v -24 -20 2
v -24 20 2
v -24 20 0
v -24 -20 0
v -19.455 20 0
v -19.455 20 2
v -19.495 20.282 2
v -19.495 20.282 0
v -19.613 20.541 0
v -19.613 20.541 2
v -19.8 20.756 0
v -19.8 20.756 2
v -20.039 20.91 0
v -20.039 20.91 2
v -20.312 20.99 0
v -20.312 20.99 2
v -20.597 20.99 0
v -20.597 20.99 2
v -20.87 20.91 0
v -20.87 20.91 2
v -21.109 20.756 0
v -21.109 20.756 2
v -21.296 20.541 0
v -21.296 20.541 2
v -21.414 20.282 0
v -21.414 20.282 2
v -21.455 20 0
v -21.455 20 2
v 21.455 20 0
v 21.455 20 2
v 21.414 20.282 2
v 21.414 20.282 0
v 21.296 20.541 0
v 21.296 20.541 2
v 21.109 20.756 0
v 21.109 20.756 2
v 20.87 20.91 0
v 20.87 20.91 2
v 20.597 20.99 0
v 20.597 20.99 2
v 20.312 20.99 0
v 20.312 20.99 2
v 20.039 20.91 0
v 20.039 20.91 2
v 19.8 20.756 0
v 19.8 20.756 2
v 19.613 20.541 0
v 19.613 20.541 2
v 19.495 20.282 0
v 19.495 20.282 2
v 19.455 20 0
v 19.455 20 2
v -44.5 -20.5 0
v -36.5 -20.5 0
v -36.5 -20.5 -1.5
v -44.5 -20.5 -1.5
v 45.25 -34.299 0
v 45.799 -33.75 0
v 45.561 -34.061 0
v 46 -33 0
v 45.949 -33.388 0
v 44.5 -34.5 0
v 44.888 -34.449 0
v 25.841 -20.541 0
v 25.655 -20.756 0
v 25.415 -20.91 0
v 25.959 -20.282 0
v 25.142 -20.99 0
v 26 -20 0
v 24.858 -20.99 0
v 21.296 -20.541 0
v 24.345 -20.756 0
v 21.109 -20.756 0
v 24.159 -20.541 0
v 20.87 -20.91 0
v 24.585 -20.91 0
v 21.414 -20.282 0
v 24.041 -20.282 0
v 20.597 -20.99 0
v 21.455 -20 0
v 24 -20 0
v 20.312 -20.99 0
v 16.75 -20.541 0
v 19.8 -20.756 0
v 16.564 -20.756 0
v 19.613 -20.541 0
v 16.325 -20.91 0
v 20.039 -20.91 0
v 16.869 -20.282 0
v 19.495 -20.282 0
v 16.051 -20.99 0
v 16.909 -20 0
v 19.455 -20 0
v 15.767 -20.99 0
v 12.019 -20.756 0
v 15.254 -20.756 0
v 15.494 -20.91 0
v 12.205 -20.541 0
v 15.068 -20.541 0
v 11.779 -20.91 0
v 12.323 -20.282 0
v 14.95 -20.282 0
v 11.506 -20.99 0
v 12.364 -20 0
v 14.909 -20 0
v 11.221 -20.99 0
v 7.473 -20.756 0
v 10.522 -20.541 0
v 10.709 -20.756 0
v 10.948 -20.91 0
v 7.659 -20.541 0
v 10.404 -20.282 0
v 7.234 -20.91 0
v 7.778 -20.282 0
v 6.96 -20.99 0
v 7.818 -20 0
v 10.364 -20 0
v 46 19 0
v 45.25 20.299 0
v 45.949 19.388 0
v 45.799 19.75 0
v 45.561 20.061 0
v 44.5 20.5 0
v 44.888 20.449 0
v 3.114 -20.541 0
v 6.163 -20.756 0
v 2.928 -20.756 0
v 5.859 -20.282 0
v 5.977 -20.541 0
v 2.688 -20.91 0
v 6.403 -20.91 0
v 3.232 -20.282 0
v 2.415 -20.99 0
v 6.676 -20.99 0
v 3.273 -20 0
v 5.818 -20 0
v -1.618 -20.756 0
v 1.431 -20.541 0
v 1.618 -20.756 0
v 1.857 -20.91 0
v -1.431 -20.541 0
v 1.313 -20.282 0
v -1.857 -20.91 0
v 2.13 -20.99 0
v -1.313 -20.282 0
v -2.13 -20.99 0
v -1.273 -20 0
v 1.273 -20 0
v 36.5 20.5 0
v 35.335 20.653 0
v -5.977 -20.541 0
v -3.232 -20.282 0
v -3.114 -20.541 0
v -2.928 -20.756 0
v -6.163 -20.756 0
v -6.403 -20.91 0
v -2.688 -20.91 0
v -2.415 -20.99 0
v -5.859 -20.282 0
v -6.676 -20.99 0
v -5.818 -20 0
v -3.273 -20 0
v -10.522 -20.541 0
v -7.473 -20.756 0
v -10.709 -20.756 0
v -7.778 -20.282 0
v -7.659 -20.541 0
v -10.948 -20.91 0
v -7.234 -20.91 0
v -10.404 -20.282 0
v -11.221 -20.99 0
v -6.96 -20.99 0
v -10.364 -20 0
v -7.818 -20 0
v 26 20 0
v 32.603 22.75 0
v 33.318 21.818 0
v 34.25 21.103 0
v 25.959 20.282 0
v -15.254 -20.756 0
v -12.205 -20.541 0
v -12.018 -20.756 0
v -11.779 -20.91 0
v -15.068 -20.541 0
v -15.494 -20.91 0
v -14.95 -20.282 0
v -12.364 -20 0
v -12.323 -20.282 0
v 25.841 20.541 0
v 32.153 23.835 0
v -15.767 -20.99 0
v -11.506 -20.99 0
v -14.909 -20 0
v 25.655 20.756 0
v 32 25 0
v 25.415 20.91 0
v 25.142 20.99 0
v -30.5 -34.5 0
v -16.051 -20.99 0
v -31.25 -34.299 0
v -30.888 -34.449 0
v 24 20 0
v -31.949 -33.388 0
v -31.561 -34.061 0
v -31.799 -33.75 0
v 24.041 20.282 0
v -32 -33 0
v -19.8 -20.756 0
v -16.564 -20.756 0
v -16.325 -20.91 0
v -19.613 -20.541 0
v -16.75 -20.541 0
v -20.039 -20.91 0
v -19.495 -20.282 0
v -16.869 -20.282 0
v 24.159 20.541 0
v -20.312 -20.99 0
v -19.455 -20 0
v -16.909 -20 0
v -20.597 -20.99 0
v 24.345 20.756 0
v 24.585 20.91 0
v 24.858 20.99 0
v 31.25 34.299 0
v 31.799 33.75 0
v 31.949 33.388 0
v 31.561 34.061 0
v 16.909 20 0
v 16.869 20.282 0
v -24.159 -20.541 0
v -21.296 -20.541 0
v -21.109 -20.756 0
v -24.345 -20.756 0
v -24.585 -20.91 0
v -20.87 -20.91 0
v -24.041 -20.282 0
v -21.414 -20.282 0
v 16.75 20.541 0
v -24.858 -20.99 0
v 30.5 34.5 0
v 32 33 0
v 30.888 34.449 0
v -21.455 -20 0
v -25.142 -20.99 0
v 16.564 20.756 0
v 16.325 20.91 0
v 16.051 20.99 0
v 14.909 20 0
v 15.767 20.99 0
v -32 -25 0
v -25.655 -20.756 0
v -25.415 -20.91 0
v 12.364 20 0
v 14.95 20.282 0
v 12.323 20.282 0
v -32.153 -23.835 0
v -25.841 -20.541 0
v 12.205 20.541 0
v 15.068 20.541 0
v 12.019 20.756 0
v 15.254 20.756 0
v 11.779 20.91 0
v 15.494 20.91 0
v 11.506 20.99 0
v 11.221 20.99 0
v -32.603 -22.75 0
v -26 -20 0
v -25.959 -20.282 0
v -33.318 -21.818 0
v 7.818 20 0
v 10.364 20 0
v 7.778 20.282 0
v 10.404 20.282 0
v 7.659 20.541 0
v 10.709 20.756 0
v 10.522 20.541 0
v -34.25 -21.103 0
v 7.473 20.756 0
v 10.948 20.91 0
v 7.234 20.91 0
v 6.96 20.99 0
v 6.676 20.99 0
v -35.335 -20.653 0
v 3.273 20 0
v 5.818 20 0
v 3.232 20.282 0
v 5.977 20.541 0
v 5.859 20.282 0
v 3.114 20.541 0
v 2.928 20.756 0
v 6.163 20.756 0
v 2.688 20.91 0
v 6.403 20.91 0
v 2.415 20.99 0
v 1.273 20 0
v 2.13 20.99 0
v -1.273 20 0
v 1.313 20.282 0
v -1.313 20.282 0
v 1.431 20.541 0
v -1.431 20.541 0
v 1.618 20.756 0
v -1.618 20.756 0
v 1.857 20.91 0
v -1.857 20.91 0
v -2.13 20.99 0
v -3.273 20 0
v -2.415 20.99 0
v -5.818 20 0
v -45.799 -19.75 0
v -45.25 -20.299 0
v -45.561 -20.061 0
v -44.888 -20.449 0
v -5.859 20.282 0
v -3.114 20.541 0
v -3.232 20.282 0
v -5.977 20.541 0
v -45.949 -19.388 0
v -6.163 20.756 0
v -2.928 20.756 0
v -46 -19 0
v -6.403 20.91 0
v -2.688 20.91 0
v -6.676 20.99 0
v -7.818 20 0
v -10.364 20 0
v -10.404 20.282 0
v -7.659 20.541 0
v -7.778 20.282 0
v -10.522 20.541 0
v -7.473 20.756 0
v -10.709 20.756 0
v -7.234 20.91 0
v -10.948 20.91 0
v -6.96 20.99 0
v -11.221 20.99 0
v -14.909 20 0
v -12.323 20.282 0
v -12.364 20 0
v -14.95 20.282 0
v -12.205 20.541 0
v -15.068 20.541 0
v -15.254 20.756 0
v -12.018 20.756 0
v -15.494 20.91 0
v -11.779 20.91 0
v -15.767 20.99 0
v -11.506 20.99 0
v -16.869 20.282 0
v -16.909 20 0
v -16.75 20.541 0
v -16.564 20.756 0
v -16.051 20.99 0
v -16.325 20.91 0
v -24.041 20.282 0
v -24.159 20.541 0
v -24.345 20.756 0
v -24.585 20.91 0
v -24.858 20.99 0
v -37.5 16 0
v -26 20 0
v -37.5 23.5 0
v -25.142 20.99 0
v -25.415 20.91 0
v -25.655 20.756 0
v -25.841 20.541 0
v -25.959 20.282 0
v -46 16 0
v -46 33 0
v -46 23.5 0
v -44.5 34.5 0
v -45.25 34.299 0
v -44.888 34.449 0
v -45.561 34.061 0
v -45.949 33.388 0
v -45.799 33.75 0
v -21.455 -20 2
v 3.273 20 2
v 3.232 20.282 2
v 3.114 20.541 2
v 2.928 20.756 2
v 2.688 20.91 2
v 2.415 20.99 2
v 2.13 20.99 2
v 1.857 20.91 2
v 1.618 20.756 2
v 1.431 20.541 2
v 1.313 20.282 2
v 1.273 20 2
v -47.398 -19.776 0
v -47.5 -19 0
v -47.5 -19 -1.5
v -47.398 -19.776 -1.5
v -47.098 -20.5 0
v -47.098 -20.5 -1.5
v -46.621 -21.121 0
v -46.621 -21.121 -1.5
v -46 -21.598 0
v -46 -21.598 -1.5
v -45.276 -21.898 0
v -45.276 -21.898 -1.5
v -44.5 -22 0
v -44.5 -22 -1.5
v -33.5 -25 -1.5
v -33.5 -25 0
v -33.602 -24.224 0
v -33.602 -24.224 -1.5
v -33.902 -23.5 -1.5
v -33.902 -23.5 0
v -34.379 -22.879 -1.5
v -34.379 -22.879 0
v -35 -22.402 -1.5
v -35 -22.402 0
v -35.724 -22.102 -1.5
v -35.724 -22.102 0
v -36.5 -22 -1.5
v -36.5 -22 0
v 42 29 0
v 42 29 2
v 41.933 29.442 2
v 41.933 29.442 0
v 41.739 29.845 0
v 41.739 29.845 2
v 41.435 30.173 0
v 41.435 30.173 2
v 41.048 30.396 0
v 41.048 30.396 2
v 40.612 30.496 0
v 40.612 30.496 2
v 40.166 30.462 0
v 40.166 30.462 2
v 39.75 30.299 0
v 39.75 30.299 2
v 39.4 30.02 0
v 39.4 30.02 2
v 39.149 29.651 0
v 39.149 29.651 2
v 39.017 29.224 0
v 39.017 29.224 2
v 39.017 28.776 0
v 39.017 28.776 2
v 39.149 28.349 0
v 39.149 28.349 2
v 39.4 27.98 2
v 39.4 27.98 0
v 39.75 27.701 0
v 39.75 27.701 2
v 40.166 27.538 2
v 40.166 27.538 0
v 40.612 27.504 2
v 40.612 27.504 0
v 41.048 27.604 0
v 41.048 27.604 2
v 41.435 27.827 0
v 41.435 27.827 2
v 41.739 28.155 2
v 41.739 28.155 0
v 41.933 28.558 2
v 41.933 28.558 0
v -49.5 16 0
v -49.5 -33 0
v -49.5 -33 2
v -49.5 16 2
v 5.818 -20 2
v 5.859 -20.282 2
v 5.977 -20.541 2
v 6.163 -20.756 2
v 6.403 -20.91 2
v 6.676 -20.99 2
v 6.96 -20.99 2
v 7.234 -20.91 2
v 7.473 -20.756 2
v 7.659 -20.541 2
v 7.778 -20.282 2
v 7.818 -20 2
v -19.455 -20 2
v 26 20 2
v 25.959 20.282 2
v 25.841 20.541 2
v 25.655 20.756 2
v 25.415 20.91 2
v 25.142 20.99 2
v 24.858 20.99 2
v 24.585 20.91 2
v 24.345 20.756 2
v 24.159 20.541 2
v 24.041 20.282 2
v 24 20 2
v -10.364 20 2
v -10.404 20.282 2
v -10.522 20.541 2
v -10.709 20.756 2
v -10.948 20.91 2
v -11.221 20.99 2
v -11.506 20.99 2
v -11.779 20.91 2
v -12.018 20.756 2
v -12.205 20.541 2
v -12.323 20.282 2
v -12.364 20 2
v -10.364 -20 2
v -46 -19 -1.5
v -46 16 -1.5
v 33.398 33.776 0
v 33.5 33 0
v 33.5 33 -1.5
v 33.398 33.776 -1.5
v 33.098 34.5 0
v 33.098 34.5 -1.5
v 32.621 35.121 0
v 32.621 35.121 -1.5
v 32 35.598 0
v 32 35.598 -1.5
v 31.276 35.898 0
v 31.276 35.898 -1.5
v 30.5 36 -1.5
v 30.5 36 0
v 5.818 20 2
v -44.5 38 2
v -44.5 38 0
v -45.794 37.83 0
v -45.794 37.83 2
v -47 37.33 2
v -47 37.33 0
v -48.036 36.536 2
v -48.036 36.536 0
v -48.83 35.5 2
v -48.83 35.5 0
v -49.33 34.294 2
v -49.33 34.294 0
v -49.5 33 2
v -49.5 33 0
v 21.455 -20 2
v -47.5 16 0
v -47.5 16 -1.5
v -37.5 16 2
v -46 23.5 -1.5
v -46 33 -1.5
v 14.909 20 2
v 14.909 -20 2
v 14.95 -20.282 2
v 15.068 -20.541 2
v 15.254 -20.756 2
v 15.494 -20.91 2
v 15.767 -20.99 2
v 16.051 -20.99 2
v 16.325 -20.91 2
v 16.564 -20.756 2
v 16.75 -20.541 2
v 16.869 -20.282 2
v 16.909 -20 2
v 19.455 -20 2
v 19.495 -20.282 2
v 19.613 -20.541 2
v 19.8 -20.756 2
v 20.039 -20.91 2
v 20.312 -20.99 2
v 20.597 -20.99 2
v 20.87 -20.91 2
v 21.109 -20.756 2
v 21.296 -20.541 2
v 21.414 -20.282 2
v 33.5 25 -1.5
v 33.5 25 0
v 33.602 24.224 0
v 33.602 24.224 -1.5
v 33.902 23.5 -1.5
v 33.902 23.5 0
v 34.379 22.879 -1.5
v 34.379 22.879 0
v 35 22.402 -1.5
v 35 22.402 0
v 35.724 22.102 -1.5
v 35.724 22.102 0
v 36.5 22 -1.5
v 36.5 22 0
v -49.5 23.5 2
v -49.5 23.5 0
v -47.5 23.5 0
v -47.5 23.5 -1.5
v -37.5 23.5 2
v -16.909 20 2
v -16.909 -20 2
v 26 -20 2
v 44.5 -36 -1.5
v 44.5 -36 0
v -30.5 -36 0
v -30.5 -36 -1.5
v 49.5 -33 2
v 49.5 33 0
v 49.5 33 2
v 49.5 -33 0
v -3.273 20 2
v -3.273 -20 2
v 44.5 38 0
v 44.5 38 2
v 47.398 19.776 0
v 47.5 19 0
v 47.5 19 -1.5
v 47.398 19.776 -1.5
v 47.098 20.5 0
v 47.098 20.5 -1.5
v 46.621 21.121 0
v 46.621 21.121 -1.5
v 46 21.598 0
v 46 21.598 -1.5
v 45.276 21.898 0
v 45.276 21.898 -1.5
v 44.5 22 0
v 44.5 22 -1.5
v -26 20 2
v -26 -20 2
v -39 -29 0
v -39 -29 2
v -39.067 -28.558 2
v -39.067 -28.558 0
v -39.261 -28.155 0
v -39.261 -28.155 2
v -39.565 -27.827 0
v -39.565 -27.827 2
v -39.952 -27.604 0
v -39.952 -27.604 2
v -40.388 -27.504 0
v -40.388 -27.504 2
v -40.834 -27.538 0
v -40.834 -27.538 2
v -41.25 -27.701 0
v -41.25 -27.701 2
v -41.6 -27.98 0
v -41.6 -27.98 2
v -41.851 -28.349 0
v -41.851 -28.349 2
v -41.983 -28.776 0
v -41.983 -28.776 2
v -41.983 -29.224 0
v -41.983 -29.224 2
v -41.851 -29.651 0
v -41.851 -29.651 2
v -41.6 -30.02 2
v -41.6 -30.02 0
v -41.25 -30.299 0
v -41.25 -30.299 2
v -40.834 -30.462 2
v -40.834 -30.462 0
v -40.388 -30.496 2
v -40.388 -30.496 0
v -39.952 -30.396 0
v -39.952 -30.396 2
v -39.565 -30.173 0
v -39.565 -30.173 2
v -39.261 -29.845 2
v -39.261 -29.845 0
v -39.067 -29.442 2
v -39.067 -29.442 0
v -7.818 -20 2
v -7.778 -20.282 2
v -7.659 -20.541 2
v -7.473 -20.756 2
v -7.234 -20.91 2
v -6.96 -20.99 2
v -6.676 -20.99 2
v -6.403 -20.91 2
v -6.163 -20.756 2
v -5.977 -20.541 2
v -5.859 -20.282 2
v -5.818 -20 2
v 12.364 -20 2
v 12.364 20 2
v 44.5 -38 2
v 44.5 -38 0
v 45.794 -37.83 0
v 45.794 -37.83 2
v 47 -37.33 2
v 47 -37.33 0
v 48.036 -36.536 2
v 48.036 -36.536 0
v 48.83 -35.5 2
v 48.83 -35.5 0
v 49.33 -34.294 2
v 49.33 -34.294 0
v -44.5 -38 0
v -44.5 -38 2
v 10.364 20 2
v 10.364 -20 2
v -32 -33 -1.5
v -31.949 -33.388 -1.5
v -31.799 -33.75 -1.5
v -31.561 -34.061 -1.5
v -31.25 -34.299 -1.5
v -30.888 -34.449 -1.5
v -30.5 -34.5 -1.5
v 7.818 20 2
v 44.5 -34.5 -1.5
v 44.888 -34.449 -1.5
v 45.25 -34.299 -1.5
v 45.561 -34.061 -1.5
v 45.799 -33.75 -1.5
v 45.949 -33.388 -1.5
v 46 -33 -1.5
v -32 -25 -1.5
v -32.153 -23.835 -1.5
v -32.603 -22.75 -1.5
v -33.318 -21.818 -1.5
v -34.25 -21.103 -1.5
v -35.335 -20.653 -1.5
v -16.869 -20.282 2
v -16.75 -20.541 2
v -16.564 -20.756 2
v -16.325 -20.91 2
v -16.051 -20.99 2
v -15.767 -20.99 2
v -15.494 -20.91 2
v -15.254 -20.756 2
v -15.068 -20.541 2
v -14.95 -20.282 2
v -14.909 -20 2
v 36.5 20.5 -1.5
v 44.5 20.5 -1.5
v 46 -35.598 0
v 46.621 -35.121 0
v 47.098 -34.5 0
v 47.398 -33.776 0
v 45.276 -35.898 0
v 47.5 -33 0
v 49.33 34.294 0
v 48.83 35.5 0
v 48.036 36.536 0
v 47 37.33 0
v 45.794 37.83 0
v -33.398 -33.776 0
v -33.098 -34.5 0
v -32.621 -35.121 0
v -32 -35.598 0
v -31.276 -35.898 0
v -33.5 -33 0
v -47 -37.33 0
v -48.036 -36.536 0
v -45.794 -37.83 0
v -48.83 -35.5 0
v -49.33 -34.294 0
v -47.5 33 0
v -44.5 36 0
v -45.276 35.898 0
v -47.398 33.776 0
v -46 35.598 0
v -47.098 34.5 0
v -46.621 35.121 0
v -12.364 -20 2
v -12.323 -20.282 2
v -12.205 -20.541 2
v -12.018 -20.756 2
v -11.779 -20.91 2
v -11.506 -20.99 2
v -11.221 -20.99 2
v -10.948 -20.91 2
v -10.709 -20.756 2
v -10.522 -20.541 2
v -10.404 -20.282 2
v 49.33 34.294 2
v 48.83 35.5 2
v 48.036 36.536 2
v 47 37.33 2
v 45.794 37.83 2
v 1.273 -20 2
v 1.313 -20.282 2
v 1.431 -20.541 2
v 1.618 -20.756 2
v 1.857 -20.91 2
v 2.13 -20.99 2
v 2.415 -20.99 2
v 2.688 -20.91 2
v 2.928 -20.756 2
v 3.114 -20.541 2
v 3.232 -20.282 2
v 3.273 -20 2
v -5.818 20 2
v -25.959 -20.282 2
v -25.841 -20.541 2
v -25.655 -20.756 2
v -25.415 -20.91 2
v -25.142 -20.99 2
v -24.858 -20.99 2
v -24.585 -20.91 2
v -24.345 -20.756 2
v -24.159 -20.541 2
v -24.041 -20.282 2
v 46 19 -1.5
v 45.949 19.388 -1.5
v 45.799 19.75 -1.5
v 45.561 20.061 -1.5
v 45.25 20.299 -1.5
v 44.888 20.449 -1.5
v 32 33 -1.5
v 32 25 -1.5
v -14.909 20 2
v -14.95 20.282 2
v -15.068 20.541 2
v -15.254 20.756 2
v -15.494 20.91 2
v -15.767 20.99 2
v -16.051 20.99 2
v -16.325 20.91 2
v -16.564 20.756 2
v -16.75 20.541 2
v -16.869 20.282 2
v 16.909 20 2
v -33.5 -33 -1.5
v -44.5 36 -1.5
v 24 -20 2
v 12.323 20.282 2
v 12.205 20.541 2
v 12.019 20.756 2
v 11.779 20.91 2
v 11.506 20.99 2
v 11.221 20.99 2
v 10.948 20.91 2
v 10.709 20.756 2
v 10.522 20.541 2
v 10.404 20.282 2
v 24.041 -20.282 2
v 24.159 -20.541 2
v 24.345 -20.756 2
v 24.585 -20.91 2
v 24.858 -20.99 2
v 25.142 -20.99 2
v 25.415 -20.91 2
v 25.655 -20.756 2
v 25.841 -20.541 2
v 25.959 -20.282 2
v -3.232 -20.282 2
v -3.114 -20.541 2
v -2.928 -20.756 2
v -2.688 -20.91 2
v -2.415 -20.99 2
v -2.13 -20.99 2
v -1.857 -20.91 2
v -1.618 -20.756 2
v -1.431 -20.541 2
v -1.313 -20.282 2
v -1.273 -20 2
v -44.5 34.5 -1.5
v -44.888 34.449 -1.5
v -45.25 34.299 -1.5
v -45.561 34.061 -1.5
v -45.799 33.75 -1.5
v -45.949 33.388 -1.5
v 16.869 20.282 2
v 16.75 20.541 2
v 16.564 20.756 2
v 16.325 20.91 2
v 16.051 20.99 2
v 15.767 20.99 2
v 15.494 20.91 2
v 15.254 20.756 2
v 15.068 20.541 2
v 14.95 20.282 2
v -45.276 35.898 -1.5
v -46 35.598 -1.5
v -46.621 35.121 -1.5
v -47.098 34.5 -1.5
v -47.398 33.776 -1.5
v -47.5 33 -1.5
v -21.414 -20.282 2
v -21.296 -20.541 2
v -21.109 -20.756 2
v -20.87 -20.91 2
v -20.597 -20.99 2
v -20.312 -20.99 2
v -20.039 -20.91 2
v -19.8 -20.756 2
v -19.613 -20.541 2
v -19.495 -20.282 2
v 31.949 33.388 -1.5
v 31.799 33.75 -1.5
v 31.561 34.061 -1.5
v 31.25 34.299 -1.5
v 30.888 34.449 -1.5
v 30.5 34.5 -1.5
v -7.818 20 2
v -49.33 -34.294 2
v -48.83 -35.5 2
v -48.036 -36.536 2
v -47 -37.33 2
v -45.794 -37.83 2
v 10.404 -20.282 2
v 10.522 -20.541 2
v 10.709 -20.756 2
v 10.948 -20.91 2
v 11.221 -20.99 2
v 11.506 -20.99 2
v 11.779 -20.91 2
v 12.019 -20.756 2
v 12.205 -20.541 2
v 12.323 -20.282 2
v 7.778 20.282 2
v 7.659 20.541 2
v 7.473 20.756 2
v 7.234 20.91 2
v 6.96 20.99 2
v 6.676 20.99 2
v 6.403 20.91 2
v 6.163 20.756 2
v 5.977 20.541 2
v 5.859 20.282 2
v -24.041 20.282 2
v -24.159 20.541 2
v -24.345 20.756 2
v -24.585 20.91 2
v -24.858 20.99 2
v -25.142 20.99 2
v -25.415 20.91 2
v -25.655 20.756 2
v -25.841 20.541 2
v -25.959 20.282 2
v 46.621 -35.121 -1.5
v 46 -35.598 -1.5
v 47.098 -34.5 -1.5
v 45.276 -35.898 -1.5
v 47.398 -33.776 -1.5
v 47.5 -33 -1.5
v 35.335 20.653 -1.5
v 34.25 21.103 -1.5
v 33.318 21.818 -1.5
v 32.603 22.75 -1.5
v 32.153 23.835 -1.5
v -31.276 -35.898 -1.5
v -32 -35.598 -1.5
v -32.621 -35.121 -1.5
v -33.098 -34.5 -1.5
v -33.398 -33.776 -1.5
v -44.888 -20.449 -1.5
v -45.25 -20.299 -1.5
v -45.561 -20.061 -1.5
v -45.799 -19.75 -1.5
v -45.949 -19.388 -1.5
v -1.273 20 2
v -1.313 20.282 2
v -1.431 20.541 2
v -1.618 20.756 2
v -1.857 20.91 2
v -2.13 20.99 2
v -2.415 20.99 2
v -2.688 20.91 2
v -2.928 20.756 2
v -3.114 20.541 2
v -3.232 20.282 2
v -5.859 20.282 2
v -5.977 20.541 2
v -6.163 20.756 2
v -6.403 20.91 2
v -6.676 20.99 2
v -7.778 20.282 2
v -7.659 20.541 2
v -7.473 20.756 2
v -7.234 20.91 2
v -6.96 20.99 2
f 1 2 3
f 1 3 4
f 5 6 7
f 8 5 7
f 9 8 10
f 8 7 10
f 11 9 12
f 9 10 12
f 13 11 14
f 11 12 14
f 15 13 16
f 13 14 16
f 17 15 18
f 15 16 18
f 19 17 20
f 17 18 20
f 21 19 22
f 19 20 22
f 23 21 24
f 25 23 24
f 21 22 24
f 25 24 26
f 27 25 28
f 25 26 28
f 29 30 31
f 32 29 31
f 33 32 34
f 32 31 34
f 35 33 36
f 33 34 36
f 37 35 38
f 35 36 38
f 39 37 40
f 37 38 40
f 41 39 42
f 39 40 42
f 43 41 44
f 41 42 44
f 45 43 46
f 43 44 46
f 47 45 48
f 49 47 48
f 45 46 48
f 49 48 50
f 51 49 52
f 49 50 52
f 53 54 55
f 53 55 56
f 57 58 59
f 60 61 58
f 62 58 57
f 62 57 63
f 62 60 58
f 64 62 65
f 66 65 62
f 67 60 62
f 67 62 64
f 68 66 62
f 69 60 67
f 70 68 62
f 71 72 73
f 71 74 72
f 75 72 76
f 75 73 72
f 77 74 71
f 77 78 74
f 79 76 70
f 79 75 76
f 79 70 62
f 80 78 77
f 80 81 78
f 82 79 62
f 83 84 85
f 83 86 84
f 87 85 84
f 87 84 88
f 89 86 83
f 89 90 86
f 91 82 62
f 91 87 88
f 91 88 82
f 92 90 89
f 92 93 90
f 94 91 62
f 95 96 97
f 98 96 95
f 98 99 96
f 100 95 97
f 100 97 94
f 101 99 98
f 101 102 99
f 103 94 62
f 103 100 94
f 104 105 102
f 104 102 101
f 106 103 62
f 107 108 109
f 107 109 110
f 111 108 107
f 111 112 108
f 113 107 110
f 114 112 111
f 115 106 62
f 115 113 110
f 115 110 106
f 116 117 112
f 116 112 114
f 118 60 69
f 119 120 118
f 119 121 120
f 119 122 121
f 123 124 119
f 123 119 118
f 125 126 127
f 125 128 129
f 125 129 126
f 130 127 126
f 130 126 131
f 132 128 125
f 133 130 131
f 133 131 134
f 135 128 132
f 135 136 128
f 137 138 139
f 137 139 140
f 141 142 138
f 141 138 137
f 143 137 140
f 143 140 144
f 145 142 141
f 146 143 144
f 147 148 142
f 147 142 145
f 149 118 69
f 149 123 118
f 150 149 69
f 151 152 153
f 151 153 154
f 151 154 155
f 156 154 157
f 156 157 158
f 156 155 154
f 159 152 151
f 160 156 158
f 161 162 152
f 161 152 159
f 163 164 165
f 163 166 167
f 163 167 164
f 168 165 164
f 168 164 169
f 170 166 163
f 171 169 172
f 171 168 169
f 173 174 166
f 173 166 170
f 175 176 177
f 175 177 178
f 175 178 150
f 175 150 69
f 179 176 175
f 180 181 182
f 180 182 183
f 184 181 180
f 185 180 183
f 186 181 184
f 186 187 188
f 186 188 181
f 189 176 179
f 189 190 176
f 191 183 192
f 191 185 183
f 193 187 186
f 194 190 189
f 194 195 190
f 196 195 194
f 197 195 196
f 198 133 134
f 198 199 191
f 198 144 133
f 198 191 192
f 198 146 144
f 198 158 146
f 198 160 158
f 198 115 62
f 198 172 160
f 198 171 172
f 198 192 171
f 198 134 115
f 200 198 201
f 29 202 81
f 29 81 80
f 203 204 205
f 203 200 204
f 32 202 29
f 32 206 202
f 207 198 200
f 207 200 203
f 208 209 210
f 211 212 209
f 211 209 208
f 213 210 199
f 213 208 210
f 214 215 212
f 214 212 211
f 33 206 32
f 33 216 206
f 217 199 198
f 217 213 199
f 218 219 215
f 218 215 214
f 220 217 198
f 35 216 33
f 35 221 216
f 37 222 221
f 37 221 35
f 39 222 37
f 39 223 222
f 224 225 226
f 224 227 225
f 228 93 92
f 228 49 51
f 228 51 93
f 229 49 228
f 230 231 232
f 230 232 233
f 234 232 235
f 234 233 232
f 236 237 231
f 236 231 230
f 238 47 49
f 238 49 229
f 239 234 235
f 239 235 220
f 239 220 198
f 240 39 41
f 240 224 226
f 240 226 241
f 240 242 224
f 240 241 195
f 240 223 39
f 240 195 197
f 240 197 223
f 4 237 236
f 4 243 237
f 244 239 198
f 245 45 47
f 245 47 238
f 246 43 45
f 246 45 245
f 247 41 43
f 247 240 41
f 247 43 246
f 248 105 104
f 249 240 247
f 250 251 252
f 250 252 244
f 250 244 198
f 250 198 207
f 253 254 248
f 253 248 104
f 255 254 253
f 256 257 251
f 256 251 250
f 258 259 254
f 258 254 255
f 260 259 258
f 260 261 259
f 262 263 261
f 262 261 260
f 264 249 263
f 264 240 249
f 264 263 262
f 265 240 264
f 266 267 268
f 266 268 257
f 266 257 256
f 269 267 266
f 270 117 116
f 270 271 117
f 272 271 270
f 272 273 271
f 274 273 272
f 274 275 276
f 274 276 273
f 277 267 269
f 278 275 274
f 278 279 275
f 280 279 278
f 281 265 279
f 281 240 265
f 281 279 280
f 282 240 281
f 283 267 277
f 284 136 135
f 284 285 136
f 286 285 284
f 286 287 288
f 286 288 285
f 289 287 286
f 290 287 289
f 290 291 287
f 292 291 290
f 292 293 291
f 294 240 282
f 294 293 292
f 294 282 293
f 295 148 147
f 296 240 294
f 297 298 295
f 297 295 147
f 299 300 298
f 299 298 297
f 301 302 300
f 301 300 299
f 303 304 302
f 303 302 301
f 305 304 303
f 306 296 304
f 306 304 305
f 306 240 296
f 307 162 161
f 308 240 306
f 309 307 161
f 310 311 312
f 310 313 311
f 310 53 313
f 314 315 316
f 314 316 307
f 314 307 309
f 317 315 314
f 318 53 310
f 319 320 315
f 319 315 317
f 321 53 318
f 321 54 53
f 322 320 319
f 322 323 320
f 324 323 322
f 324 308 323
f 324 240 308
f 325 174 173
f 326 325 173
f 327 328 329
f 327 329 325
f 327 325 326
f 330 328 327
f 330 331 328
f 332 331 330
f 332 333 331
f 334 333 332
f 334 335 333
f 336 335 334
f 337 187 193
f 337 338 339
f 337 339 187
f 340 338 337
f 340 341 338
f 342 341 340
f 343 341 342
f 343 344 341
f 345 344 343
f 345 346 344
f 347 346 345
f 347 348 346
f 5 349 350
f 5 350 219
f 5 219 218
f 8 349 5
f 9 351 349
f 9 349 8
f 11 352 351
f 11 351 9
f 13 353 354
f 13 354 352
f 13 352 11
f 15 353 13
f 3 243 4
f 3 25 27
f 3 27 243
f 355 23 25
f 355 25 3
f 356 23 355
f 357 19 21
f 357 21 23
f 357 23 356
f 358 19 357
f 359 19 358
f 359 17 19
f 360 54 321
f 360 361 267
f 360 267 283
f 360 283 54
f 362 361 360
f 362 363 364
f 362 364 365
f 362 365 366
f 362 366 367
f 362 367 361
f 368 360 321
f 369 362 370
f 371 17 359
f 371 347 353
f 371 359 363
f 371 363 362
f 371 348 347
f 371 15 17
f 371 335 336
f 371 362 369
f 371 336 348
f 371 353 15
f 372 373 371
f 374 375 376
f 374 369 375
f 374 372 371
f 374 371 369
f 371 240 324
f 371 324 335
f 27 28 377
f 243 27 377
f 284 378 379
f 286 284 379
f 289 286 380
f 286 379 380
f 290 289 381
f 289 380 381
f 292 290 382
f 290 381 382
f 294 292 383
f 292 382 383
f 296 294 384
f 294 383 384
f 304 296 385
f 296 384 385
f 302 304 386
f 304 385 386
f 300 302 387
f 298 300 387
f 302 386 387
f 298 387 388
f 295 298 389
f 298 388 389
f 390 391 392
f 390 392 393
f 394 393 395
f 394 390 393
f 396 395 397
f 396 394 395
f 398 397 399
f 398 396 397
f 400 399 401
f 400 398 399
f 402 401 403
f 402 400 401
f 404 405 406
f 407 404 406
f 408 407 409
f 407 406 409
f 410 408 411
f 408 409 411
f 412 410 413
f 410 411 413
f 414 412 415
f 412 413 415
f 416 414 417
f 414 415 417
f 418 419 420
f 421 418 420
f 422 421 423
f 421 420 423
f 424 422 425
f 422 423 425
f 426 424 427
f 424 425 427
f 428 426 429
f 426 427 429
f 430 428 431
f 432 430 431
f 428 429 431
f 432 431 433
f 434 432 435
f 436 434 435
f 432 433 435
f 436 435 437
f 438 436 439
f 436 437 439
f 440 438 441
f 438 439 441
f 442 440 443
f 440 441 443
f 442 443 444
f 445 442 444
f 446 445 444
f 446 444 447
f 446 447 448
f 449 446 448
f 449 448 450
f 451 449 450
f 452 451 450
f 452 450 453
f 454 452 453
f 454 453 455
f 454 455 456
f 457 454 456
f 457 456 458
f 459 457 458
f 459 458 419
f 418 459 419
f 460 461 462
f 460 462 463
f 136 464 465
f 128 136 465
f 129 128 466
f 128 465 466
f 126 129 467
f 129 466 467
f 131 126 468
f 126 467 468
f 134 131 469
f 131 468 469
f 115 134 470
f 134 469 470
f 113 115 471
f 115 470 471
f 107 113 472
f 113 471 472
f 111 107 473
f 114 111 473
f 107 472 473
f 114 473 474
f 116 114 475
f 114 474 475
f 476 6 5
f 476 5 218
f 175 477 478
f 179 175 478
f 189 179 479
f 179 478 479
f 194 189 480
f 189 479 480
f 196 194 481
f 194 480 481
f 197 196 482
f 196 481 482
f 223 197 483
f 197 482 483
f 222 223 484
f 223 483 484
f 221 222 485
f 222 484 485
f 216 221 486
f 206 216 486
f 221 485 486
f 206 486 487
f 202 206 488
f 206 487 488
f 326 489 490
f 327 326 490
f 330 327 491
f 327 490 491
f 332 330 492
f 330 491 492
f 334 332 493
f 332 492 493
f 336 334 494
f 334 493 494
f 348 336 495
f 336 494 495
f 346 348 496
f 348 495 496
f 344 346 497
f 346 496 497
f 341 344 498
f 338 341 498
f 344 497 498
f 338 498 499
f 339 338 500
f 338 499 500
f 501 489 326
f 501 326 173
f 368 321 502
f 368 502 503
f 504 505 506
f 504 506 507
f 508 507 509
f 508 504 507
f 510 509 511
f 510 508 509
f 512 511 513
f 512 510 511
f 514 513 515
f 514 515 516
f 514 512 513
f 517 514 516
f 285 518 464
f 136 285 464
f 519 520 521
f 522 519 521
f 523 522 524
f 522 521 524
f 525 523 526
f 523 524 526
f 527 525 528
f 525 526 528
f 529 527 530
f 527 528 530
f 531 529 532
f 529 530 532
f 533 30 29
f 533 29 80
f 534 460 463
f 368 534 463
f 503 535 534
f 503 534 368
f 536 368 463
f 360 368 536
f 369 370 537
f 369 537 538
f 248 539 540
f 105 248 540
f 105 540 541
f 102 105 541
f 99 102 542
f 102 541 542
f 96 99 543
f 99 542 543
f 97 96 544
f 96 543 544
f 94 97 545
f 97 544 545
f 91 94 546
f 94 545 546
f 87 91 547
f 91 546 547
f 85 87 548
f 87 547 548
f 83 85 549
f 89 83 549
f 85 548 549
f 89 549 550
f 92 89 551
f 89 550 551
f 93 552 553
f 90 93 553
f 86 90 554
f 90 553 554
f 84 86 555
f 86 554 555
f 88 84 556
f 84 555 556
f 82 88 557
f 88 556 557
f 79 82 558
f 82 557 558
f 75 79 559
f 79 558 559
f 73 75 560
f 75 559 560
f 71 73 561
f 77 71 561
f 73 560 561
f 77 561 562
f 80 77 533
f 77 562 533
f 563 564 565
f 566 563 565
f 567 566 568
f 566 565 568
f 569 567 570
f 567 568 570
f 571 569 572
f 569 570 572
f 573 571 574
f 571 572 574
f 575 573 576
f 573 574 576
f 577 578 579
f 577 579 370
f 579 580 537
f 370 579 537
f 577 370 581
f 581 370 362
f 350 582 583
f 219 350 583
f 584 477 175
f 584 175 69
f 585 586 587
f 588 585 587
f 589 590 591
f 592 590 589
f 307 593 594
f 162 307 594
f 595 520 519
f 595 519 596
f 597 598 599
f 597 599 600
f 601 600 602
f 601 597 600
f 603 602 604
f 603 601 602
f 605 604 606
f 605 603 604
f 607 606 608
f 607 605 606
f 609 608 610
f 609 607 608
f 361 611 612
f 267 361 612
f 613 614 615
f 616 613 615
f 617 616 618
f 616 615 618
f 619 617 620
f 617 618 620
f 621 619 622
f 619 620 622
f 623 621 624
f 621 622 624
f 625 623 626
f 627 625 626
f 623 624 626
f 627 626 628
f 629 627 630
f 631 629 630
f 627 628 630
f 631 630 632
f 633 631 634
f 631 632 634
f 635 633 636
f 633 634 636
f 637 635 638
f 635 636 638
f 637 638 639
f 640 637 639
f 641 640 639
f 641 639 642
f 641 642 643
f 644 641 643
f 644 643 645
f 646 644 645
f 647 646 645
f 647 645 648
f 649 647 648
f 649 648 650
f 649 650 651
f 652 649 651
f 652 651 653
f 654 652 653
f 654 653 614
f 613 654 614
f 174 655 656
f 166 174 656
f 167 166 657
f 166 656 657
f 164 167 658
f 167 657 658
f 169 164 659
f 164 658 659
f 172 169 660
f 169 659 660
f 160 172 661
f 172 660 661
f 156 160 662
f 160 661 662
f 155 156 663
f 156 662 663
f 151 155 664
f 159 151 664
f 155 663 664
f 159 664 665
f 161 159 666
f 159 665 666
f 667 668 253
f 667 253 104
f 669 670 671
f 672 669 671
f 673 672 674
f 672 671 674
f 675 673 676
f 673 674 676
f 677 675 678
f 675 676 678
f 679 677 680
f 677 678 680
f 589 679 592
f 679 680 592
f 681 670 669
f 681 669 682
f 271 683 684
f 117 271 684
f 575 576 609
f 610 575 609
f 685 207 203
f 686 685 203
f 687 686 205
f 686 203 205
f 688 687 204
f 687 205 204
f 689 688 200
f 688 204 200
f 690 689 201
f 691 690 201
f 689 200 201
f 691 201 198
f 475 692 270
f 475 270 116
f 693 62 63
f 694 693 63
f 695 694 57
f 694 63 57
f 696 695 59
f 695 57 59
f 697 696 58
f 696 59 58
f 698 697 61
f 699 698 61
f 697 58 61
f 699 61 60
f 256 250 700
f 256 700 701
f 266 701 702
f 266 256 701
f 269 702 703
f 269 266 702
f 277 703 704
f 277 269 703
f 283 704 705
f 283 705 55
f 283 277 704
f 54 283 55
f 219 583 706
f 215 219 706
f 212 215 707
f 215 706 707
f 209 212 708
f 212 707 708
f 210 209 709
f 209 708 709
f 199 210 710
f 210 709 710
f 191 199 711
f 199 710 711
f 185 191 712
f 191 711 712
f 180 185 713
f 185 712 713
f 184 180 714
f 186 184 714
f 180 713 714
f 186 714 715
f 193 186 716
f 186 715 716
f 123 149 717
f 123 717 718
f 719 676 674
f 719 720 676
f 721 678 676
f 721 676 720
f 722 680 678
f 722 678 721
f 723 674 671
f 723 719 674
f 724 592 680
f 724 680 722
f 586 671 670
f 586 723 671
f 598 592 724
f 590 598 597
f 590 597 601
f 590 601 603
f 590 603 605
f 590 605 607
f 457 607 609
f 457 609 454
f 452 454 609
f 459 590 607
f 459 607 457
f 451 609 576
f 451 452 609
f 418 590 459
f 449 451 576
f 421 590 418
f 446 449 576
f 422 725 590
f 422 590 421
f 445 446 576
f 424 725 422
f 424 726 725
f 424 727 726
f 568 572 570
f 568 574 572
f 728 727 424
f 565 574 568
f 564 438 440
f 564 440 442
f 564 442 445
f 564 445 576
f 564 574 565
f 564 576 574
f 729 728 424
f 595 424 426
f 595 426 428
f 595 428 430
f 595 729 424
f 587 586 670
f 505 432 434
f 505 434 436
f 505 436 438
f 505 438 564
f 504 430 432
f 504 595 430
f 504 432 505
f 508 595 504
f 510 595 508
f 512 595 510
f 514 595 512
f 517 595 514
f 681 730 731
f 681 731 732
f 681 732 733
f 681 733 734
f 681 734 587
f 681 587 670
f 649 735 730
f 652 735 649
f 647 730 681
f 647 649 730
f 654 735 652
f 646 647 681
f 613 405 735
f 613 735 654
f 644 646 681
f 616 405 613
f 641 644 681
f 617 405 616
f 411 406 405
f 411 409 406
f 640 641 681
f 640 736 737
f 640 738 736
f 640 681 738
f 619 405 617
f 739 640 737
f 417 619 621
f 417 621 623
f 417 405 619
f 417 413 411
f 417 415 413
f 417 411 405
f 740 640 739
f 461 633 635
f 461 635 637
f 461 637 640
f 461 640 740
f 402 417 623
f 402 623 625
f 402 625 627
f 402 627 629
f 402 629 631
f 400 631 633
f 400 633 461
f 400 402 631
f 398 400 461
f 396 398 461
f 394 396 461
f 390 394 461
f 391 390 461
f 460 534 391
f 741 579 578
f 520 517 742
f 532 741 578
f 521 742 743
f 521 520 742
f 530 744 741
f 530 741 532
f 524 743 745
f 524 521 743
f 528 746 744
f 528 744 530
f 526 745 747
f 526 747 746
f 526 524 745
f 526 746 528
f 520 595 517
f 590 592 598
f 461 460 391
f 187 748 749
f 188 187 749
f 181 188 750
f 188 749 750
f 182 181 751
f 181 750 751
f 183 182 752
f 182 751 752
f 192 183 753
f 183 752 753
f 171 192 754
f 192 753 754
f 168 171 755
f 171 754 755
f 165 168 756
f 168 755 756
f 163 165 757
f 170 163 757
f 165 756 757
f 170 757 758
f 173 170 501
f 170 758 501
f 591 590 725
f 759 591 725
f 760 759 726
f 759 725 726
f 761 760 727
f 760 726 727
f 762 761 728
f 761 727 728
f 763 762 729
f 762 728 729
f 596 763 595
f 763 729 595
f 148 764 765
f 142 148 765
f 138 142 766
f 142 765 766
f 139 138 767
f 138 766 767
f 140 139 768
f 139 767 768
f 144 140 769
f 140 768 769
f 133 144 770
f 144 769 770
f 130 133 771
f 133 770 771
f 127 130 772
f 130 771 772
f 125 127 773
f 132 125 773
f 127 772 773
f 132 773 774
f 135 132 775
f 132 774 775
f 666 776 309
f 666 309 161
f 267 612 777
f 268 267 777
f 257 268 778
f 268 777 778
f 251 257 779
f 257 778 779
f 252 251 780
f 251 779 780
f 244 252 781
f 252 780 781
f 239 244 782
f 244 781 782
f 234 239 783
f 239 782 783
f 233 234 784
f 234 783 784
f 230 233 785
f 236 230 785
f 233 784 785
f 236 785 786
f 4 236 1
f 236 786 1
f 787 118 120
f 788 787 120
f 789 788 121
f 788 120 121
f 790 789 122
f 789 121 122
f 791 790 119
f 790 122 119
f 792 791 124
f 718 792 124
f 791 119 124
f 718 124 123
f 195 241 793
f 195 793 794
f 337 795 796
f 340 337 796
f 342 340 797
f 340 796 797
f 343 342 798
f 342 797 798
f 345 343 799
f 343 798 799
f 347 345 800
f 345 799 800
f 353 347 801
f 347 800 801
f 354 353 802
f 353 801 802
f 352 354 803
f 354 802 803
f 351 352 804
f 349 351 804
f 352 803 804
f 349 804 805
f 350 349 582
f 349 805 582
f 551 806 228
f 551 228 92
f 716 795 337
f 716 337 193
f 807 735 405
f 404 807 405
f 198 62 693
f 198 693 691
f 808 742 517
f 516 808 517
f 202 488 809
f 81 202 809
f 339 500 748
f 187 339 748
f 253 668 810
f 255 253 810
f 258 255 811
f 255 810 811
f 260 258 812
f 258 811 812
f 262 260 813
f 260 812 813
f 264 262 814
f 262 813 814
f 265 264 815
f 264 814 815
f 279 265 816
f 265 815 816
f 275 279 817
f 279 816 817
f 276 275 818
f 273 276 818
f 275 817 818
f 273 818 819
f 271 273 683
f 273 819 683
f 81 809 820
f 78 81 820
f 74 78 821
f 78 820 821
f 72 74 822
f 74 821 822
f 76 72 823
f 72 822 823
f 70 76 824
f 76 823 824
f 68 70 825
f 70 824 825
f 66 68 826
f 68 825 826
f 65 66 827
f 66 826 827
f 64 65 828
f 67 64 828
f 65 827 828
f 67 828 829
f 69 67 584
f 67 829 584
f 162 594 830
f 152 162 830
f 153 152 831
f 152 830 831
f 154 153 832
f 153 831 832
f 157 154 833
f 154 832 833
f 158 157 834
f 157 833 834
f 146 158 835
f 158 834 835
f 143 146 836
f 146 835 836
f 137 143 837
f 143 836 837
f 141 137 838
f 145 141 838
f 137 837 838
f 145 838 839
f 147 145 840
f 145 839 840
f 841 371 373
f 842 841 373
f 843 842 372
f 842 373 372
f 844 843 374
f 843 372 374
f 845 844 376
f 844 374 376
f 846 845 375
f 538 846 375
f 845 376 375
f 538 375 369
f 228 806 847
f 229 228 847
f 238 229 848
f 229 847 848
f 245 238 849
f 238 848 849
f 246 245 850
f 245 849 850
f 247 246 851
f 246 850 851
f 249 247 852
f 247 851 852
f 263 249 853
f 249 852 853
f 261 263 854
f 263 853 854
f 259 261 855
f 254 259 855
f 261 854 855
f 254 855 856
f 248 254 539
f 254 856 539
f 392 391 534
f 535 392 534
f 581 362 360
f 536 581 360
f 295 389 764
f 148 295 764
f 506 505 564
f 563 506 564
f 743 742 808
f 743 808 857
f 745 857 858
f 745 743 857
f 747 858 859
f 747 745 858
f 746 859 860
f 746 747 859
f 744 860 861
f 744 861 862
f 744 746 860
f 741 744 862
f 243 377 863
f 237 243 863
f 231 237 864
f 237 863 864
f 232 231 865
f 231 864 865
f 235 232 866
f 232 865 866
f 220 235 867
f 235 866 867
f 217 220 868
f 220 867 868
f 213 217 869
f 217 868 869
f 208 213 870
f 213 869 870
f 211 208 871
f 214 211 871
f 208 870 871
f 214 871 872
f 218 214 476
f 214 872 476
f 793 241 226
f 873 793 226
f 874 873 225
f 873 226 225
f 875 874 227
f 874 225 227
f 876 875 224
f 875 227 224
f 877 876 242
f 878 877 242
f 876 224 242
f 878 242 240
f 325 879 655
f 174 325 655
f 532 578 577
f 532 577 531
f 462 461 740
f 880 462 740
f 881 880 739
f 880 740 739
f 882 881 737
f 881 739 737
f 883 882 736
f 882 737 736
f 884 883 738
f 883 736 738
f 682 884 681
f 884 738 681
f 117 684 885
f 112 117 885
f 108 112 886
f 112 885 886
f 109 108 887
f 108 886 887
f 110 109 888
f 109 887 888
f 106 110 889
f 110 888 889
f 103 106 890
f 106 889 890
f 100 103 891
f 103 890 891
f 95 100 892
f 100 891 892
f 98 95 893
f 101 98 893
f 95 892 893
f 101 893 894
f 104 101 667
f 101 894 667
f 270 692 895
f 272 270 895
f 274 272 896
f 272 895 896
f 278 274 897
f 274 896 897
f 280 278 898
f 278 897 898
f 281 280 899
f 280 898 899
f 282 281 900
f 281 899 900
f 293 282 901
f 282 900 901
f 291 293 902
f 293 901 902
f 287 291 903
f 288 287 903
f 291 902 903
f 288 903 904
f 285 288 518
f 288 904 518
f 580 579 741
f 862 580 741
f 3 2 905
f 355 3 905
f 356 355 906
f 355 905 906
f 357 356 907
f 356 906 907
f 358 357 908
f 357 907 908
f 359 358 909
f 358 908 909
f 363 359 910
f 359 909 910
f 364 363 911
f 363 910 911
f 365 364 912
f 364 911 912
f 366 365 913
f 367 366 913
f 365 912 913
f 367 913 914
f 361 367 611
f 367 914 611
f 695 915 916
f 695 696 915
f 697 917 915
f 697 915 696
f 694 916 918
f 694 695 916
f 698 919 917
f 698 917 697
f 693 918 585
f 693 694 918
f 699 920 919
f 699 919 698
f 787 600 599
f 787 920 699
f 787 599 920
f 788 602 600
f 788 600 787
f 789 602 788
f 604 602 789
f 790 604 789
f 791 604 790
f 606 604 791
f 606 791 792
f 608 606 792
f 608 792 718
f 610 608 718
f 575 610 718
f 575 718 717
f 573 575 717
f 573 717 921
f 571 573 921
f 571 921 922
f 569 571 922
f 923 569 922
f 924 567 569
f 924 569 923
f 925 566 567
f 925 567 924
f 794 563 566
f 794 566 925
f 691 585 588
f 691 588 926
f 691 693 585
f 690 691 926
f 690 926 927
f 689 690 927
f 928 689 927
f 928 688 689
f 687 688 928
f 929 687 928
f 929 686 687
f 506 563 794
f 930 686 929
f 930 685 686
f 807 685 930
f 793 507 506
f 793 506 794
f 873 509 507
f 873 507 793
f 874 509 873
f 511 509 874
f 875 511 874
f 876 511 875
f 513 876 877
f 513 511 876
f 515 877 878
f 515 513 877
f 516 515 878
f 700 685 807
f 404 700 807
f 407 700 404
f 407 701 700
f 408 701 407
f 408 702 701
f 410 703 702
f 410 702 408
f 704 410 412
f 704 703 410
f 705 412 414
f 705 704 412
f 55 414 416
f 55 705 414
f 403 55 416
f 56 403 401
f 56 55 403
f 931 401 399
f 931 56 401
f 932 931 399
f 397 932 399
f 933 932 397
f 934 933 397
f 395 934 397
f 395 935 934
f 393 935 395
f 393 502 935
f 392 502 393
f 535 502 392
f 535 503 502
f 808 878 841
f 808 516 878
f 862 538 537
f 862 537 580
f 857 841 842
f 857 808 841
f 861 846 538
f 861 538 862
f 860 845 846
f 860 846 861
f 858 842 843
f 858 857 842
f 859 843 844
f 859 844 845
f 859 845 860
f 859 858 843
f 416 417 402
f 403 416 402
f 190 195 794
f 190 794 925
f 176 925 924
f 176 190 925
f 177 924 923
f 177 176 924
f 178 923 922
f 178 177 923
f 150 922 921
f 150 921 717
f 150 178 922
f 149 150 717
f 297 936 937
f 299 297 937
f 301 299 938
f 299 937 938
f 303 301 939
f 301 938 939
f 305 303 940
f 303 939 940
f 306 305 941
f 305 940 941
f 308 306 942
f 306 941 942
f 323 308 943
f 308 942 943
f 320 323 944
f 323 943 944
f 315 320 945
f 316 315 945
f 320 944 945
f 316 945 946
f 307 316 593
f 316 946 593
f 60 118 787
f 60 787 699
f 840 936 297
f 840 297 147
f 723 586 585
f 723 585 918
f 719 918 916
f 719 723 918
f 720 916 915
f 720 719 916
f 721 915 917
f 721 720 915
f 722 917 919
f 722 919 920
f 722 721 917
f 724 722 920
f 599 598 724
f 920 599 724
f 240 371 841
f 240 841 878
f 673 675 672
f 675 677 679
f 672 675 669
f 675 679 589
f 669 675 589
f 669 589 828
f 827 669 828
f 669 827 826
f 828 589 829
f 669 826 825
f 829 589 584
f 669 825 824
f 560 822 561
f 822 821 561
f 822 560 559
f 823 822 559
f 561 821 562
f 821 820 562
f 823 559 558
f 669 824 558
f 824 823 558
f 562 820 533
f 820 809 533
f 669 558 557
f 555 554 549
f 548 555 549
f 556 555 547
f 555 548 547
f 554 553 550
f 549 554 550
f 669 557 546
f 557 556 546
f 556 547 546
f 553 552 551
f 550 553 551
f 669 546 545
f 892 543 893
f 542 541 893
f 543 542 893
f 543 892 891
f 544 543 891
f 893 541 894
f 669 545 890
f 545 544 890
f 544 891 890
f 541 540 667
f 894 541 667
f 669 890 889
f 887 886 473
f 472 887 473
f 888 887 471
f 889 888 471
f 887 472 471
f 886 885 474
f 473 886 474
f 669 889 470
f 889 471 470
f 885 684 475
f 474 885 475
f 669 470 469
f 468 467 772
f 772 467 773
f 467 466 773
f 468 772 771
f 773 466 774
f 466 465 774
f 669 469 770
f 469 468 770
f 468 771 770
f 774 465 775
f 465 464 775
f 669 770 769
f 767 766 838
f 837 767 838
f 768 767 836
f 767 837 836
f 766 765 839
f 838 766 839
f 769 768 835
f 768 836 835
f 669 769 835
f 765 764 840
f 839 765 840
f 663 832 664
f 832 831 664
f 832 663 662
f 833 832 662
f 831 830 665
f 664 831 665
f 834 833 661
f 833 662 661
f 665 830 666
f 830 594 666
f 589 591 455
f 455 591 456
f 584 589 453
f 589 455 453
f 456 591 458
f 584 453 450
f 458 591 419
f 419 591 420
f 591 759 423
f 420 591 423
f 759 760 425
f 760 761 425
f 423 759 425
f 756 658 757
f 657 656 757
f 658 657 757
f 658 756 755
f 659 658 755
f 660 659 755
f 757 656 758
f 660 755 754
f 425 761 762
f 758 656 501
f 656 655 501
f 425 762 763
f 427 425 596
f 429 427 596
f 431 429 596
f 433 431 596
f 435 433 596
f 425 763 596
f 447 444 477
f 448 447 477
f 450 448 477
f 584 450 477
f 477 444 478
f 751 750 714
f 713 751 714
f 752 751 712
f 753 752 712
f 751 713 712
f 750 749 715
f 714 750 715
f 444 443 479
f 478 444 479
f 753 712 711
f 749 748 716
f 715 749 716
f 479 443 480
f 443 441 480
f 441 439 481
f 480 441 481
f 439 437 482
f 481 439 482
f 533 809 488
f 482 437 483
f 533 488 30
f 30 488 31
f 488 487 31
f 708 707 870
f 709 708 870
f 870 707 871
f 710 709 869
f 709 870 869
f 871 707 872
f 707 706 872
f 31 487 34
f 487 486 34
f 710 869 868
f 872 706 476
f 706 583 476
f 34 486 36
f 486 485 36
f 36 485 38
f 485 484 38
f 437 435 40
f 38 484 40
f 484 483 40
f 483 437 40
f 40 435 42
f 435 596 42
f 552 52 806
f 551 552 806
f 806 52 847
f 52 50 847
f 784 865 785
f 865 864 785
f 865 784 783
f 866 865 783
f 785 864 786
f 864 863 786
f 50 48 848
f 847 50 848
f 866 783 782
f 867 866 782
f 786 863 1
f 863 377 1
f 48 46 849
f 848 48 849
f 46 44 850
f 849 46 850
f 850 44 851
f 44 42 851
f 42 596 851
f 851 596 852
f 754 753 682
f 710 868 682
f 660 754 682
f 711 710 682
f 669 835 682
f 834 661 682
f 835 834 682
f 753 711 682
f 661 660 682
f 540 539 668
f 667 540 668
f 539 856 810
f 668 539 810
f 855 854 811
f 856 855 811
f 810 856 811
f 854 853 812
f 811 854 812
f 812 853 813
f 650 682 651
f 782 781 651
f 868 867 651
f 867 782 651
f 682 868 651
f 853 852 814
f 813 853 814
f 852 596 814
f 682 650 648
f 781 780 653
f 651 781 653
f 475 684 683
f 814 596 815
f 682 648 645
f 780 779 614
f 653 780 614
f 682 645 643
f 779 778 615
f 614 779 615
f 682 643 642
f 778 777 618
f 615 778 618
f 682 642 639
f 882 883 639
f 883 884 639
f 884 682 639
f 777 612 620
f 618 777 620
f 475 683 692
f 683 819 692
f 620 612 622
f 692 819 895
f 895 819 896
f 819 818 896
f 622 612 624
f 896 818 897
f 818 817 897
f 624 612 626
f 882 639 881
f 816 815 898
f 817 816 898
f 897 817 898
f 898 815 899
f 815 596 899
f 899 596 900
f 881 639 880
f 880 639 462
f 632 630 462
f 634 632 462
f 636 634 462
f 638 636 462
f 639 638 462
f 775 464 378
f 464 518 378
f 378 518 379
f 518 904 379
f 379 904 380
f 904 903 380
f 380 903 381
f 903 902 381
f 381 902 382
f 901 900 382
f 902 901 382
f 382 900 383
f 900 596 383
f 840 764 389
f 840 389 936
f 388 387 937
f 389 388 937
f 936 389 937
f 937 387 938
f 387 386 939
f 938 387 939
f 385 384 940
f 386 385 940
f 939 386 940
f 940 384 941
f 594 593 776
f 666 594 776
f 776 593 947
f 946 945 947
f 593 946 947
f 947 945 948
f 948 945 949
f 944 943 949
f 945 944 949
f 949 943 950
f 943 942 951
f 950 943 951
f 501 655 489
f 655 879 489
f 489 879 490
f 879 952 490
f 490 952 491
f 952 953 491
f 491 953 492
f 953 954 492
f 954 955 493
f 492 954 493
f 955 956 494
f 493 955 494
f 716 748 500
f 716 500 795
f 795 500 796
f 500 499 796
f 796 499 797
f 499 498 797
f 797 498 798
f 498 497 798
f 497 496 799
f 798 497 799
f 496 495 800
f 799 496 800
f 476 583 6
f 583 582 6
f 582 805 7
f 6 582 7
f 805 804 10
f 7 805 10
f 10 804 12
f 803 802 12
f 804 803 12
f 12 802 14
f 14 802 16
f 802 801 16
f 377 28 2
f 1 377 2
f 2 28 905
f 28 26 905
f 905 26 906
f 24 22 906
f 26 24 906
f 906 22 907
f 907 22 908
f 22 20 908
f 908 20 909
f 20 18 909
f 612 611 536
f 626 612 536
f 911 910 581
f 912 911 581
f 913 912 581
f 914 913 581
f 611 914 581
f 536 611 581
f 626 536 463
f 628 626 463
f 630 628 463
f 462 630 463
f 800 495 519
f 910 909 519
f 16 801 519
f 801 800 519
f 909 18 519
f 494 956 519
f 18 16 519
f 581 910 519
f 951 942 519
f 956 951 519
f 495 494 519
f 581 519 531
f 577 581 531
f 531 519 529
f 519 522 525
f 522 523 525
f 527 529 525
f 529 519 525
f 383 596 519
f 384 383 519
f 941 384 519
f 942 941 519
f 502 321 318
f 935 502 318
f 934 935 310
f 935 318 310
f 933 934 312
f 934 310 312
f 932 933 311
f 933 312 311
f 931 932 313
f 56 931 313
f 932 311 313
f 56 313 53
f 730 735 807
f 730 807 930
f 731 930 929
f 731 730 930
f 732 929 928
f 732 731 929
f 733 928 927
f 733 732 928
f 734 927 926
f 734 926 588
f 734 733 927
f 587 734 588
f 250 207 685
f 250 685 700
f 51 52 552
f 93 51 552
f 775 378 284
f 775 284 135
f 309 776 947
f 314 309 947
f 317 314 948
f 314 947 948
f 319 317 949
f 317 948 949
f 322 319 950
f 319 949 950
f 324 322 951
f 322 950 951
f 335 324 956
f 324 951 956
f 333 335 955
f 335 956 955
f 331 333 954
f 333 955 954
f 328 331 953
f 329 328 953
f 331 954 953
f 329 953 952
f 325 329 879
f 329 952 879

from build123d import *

# Parameters (mm, degrees)
PAD_DEPTH            = 2
PAD001_DEPTH         = 3.5
SKETCH002_R          = 1.5
POCKET_DEPTH         = 5
POCKET001_DEPTH      = 5
LINEARPATTERN_COUNT  = 12
LINEARPATTERN_PITCH  = 4.545455
SKETCH004_W          = 12
SKETCH004_H          = 7.5
POCKET002_DEPTH      = 10
POCKET002_DEPTH_BACK = -100


with BuildPart() as part:
    # Sketch → Pad (new body)
    with BuildSketch(Plane.XY):
        with BuildLine():
            Line((-44.5, 38), (44.5, 38))
            ThreePointArc((49.5, 33), (48.035534, 36.535534), (44.5, 38))
            Line((49.5, 33), (49.5, -33))
            ThreePointArc((44.5, -38), (48.035534, -36.535534), (49.5, -33))
            Line((44.5, -38), (-44.5, -38))
            ThreePointArc((-49.5, -33), (-48.035534, -36.535534), (-44.5, -38))
            Line((-49.5, -33), (-49.5, 33))
            ThreePointArc((-44.5, 38), (-48.035534, 36.535534), (-49.5, 33))
        make_face()
    extrude(amount=PAD_DEPTH)

    # Sketch001 (on Face10 of Pad) → Pad001 (join)
    with BuildSketch(Plane.XY.offset(2)):
        with BuildLine():
            Line((-44.5, 36), (30.5, 36))
            ThreePointArc((33.5, 33), (32.62132, 35.12132), (30.5, 36))
            Line((33.5, 33), (33.5, 25))
            ThreePointArc((33.5, 25), (34.37868, 22.87868), (36.5, 22))
            Line((36.5, 22), (44.5, 22))
            ThreePointArc((47.5, 19), (46.62132, 21.12132), (44.5, 22))
            Line((47.5, 19), (47.5, -33))
            ThreePointArc((44.5, -36), (46.62132, -35.12132), (47.5, -33))
            Line((44.5, -36), (-30.5, -36))
            ThreePointArc((-33.5, -33), (-32.62132, -35.12132), (-30.5, -36))
            Line((-33.5, -33), (-33.5, -25))
            ThreePointArc((-33.5, -25), (-34.37868, -22.87868), (-36.5, -22))
            Line((-36.5, -22), (-44.5, -22))
            ThreePointArc((-47.5, -19), (-46.62132, -21.12132), (-44.5, -22))
            Line((-47.5, -19), (-47.5, 33))
            ThreePointArc((-44.5, 36), (-46.62132, 35.12132), (-47.5, 33))
        make_face()
        with BuildLine():
            Line((-46, -19), (-46, 33))
            ThreePointArc((-44.5, 34.5), (-45.56066, 34.06066), (-46, 33))
            Line((-44.5, 34.5), (30.5, 34.5))
            ThreePointArc((32, 33), (31.56066, 34.06066), (30.5, 34.5))
            Line((32, 33), (32, 25))
            ThreePointArc((32, 25), (33.318019, 21.818019), (36.5, 20.5))
            Line((36.5, 20.5), (44.5, 20.5))
            ThreePointArc((46, 19), (45.56066, 20.06066), (44.5, 20.5))
            Line((46, 19), (46, -33))
            ThreePointArc((44.5, -34.5), (45.56066, -34.06066), (46, -33))
            Line((44.5, -34.5), (-30.5, -34.5))
            ThreePointArc((-32, -33), (-31.56066, -34.06066), (-30.5, -34.5))
            Line((-32, -33), (-32, -25))
            ThreePointArc((-32, -25), (-33.318019, -21.818019), (-36.5, -20.5))
            Line((-36.5, -20.5), (-44.5, -20.5))
            ThreePointArc((-46, -19), (-45.56066, -20.06066), (-44.5, -20.5))
        make_face(mode=Mode.SUBTRACT)
    extrude(amount=-PAD001_DEPTH)

    # Sketch002 (on Face5 of Pad001) → Pocket (cut)
    with BuildSketch(Plane.XY.offset(2)):
        with Locations((40.5, 29)):
            Circle(SKETCH002_R)
        with Locations((-40.5, -29)):
            Circle(SKETCH002_R)
    extrude(amount=-POCKET_DEPTH, mode=Mode.SUBTRACT)

    # Sketch003 (on Face46 of Pocket) → Pocket001 (cut)
    with BuildSketch(Plane.XY.offset(2)):
        with BuildLine():
            ThreePointArc((-24, 20), (-25, 21), (-26, 20))
            Line((-26, 20), (-26, -20))
            ThreePointArc((-26, -20), (-25, -21), (-24, -20))
            Line((-24, 20), (-24, -20))
        make_face()
    pocket001 = extrude(amount=-POCKET001_DEPTH, mode=Mode.SUBTRACT)

    # LinearPattern: Pocket001 ×12
    with Locations(*[(i * LINEARPATTERN_PITCH, 0, 0) for i in range(1, LINEARPATTERN_COUNT)]):
        add(pocket001, mode=Mode.SUBTRACT)

    # Sketch004 (on Face4 of LinearPattern) → Pocket002 (cut, two sides)
    with BuildSketch(Plane(origin=(0, 0, 0), x_dir=(1, 0, 0), z_dir=(0, 0, -1))) as pocket002_sk:
        with Locations((-43.5, -19.75)):
            Rectangle(SKETCH004_W, SKETCH004_H)
    extrude(amount=-POCKET002_DEPTH, mode=Mode.SUBTRACT)
    extrude(pocket002_sk.sketch, amount=-POCKET002_DEPTH_BACK, mode=Mode.SUBTRACT)


solid = part.part
